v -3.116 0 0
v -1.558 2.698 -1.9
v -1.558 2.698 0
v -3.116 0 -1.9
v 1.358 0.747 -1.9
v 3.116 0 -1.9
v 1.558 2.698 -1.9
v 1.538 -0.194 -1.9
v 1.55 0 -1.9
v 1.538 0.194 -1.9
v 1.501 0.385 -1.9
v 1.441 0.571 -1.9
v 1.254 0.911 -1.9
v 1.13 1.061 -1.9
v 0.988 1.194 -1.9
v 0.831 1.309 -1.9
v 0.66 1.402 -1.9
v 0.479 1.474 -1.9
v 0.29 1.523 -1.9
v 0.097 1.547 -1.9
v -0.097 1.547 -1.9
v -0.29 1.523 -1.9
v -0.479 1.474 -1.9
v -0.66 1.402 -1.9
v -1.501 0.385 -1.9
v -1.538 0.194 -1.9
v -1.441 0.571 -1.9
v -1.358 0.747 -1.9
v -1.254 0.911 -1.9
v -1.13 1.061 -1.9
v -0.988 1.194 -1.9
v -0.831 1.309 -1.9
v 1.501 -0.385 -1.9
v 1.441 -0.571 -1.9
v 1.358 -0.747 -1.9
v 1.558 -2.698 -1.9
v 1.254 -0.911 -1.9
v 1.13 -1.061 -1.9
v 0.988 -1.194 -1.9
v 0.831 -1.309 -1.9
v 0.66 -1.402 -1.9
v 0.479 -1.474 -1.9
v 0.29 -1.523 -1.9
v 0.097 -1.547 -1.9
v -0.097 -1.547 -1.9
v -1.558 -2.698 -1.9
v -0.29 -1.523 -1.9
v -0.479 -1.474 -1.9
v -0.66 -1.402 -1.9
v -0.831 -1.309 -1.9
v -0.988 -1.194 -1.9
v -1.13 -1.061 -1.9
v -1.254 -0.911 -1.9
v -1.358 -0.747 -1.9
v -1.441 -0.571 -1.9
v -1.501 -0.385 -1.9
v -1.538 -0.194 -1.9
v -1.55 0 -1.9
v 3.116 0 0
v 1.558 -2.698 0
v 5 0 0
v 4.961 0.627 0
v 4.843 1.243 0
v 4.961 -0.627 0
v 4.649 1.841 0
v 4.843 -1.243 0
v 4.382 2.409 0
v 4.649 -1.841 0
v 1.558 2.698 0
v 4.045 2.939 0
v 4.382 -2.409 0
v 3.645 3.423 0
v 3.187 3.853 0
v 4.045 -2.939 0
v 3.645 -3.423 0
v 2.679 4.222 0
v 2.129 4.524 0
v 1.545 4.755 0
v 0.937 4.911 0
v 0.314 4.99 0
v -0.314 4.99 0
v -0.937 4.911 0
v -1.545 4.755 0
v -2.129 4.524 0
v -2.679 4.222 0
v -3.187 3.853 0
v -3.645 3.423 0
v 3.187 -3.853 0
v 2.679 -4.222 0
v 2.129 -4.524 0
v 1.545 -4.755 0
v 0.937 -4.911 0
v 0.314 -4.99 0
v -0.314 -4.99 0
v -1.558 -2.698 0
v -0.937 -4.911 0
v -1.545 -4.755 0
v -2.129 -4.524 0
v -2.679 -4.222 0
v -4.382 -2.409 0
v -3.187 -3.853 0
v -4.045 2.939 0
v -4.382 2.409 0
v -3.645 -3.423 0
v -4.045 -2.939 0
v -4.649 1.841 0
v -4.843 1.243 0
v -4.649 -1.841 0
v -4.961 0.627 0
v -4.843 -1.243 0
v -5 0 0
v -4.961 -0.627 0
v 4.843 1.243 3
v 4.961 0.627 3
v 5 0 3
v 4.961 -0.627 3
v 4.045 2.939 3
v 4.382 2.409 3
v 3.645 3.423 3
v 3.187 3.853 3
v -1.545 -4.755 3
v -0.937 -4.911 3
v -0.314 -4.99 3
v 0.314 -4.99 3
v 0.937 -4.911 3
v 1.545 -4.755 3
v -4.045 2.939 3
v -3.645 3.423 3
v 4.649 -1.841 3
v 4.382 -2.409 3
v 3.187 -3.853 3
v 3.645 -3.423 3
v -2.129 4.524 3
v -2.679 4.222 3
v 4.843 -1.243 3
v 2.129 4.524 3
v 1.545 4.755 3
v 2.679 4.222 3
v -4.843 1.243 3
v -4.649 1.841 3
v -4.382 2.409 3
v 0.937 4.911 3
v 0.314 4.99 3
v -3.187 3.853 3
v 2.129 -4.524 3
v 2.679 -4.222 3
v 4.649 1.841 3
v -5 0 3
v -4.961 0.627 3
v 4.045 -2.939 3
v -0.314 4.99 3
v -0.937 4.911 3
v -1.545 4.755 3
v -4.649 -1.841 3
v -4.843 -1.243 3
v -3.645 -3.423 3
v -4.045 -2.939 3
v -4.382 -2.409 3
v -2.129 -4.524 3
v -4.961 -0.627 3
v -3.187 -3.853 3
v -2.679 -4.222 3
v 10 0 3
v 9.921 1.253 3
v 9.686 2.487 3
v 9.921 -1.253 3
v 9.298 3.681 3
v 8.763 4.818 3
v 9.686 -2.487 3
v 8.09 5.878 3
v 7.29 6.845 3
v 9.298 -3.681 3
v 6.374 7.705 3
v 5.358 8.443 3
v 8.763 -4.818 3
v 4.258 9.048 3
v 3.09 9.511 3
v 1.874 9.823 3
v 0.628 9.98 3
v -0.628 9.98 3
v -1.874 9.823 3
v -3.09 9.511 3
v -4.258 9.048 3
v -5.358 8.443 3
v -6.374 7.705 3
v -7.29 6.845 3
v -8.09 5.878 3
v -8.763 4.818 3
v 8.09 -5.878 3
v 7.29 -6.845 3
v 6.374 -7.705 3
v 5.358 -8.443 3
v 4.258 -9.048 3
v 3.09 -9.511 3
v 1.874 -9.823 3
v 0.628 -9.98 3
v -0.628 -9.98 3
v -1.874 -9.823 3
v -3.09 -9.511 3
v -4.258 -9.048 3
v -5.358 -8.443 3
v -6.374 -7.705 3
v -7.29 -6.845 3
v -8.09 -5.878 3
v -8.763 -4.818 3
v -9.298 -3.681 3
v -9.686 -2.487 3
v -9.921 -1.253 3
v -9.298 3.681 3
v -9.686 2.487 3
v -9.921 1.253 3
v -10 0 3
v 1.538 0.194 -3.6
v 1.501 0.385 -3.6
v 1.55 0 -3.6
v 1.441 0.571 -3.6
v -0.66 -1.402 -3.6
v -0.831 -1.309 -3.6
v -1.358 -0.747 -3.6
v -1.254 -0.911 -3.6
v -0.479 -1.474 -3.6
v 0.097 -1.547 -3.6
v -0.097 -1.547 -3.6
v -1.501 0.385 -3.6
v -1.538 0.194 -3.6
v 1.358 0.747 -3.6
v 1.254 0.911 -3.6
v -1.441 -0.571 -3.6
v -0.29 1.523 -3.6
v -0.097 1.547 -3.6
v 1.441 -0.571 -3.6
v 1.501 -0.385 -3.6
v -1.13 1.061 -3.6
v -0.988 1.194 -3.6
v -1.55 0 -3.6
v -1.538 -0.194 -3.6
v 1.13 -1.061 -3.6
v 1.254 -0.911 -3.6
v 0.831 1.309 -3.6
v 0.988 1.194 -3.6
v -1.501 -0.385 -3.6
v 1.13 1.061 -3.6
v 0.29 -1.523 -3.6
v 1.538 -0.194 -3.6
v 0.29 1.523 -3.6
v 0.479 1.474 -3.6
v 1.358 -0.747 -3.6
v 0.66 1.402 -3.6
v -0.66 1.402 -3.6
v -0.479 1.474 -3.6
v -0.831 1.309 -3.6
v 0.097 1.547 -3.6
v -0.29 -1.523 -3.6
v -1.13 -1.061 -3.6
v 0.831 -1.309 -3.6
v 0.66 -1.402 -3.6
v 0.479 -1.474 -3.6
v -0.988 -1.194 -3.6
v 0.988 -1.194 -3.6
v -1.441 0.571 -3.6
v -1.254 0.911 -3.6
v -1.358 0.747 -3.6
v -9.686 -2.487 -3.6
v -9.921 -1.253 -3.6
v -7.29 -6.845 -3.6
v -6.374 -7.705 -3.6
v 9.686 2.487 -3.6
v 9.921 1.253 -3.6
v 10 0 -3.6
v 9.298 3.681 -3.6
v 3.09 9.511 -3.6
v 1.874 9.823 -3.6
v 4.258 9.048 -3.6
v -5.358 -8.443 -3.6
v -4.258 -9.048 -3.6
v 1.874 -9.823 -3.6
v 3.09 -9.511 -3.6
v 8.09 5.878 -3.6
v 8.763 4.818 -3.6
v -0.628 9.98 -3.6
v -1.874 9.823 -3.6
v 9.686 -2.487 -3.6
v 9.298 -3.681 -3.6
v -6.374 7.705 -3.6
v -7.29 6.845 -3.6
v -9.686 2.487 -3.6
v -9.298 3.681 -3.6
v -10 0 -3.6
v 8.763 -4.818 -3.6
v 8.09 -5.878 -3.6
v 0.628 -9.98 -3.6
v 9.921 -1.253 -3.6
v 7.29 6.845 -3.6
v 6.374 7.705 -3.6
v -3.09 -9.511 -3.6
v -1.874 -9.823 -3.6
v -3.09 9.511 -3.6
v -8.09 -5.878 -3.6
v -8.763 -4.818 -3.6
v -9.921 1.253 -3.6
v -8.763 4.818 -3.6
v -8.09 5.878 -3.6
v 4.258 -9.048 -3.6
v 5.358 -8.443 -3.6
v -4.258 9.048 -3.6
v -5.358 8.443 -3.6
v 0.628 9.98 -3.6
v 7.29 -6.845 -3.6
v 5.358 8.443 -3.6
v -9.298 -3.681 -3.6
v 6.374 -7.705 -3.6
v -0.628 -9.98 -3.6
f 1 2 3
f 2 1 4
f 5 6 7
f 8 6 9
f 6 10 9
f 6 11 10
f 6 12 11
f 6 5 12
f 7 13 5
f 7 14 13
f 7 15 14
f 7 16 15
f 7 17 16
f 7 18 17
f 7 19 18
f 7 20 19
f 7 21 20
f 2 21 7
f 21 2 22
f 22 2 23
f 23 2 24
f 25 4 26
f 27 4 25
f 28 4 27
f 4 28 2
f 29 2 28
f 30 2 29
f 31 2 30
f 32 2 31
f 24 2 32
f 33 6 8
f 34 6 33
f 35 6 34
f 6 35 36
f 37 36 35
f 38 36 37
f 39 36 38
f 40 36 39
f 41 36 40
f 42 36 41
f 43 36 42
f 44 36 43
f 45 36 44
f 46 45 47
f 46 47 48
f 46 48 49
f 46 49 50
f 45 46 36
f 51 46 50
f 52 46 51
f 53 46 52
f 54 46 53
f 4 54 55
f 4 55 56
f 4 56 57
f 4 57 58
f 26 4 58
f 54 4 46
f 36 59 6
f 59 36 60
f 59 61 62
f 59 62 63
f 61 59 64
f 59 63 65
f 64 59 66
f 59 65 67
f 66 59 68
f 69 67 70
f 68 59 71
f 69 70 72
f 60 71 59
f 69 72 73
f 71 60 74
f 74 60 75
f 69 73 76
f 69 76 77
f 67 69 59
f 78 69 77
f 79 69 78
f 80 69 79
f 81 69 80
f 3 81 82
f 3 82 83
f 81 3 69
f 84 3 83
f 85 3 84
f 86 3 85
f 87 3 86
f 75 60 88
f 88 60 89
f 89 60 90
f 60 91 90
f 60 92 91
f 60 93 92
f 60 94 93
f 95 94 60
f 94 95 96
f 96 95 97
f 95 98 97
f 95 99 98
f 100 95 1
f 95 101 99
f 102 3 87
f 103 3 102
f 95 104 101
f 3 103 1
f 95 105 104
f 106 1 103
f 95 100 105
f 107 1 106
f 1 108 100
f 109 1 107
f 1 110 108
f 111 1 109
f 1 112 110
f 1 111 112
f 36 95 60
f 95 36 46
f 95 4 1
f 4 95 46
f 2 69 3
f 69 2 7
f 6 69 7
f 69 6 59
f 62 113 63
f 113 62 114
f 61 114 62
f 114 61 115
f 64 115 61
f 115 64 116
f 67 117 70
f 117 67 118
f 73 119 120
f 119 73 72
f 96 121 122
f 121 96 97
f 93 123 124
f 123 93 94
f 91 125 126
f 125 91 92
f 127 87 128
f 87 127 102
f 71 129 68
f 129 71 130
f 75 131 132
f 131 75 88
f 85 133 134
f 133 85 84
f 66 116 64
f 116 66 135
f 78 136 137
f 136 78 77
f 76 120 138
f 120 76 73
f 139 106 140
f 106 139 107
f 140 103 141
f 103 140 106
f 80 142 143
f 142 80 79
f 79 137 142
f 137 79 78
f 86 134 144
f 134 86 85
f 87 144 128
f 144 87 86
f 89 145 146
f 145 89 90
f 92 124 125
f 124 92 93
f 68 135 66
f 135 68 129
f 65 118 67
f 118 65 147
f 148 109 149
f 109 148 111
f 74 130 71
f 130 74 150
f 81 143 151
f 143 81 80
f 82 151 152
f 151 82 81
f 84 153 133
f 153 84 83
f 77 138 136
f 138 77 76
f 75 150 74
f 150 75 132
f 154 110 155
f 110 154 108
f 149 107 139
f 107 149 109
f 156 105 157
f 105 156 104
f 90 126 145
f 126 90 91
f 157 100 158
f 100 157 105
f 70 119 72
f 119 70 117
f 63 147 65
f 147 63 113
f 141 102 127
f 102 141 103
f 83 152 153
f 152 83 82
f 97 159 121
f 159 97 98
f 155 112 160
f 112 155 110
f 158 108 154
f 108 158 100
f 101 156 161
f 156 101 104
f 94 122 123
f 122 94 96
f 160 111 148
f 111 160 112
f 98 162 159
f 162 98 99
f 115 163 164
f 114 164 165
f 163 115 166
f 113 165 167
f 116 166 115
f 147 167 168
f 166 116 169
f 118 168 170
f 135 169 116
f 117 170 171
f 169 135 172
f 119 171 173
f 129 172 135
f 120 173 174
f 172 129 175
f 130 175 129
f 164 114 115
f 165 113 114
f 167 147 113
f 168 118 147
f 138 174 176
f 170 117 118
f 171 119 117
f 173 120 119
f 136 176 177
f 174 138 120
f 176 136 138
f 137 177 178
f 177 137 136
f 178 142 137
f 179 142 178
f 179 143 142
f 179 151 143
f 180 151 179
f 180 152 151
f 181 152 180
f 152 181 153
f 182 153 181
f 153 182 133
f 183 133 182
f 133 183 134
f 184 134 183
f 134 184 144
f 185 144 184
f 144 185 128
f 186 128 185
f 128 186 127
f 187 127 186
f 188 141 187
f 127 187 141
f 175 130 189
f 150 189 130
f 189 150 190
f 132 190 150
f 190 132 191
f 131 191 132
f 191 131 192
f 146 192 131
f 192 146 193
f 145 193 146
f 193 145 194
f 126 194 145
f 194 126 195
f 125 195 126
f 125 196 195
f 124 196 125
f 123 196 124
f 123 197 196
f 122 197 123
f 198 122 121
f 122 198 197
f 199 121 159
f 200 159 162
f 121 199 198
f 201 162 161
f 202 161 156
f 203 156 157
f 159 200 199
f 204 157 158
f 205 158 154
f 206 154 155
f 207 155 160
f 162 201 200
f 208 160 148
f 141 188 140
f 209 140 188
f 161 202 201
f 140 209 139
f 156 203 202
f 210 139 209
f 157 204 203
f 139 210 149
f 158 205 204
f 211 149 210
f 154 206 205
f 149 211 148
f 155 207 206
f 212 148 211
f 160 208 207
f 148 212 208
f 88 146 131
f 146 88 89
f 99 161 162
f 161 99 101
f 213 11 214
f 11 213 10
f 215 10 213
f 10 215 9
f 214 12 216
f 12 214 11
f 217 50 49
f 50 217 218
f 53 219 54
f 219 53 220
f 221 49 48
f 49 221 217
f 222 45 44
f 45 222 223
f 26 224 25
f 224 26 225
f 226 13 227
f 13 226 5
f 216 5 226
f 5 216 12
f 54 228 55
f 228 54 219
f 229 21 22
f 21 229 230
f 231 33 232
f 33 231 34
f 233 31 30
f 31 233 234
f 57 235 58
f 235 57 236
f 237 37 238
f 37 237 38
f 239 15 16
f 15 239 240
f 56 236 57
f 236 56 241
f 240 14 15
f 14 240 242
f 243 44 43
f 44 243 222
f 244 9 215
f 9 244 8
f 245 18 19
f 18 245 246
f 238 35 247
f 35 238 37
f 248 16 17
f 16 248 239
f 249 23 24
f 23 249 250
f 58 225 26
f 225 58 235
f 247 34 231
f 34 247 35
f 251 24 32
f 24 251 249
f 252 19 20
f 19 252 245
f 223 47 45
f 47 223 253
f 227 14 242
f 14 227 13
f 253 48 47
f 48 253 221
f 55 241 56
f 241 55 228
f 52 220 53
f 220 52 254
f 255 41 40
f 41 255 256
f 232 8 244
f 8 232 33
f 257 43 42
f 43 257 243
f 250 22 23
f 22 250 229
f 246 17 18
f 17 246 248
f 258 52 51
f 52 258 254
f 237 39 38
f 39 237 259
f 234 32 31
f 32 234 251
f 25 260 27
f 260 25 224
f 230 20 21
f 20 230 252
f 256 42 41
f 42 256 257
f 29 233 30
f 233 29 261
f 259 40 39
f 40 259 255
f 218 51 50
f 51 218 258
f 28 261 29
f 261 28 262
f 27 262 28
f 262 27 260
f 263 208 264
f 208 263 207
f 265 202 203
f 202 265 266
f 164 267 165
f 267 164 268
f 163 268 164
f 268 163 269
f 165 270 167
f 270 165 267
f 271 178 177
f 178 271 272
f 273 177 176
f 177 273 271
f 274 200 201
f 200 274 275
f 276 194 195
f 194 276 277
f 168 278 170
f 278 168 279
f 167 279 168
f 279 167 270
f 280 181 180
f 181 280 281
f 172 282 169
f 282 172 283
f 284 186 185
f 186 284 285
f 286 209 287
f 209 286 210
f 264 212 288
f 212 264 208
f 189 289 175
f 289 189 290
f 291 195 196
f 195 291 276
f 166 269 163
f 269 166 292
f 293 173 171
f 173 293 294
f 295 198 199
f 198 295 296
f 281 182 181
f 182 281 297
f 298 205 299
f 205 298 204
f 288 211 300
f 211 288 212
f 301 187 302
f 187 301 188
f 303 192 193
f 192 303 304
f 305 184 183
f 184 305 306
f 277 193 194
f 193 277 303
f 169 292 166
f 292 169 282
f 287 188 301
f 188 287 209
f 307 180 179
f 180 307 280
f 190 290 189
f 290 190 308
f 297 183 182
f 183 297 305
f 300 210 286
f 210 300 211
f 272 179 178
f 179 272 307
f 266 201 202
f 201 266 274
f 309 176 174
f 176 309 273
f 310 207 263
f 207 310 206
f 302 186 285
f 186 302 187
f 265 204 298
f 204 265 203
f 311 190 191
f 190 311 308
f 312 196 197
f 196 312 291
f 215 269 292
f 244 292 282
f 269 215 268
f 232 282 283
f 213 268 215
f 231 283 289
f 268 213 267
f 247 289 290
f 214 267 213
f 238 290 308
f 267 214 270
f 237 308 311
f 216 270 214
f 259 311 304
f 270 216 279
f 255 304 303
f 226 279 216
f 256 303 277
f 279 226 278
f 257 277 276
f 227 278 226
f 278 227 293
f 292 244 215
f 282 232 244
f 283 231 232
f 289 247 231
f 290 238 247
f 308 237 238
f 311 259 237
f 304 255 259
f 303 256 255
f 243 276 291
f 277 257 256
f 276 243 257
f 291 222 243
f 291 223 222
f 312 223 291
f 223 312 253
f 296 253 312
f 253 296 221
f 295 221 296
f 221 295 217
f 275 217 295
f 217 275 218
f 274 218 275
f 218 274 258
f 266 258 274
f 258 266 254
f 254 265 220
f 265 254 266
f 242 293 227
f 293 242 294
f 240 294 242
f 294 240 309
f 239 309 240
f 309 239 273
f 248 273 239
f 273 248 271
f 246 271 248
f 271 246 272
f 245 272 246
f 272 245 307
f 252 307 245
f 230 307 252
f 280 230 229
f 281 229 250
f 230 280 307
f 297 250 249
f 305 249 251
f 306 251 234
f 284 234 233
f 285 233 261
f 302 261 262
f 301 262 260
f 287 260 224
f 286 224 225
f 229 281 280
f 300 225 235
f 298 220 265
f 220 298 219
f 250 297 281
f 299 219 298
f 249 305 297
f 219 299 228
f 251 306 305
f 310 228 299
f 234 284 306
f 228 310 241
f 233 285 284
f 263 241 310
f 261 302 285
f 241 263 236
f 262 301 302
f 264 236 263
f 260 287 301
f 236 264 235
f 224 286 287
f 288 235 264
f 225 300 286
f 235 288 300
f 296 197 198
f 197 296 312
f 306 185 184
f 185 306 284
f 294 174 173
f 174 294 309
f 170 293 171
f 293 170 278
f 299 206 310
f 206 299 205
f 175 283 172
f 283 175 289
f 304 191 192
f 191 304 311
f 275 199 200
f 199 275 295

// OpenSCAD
$fn = 50;

difference() {
	union() {
		translate(v = [0, 0, -3.5999999999999996]) {
			cylinder(h = 6.6, r = 10.0);
		}
	}
	union() {
		translate(v = [0, 0, 0]) {
			rotate(a = [0, 0, 0]) {
				difference() {
					union() {
						translate(v = [0, 0, -1.9]) {
							linear_extrude(height = 1.9) {
								polygon(points = [[3.1158, 0.0], [1.5579000000000005, 2.698361953111554], [-1.5578999999999994, 2.6983619531115544], [-3.1158, 3.815754496783323e-16], [-1.5579000000000014, -2.6983619531115535], [1.557899999999998, -2.6983619531115552]]);
							}
						}
					}
					union();
				}
			}
		}
		#cylinder(h = 3, r = 5.0);
		#translate(v = [0, 0, -100.0]) {
			cylinder(h = 200, r = 1.55);
		}
	}
}
